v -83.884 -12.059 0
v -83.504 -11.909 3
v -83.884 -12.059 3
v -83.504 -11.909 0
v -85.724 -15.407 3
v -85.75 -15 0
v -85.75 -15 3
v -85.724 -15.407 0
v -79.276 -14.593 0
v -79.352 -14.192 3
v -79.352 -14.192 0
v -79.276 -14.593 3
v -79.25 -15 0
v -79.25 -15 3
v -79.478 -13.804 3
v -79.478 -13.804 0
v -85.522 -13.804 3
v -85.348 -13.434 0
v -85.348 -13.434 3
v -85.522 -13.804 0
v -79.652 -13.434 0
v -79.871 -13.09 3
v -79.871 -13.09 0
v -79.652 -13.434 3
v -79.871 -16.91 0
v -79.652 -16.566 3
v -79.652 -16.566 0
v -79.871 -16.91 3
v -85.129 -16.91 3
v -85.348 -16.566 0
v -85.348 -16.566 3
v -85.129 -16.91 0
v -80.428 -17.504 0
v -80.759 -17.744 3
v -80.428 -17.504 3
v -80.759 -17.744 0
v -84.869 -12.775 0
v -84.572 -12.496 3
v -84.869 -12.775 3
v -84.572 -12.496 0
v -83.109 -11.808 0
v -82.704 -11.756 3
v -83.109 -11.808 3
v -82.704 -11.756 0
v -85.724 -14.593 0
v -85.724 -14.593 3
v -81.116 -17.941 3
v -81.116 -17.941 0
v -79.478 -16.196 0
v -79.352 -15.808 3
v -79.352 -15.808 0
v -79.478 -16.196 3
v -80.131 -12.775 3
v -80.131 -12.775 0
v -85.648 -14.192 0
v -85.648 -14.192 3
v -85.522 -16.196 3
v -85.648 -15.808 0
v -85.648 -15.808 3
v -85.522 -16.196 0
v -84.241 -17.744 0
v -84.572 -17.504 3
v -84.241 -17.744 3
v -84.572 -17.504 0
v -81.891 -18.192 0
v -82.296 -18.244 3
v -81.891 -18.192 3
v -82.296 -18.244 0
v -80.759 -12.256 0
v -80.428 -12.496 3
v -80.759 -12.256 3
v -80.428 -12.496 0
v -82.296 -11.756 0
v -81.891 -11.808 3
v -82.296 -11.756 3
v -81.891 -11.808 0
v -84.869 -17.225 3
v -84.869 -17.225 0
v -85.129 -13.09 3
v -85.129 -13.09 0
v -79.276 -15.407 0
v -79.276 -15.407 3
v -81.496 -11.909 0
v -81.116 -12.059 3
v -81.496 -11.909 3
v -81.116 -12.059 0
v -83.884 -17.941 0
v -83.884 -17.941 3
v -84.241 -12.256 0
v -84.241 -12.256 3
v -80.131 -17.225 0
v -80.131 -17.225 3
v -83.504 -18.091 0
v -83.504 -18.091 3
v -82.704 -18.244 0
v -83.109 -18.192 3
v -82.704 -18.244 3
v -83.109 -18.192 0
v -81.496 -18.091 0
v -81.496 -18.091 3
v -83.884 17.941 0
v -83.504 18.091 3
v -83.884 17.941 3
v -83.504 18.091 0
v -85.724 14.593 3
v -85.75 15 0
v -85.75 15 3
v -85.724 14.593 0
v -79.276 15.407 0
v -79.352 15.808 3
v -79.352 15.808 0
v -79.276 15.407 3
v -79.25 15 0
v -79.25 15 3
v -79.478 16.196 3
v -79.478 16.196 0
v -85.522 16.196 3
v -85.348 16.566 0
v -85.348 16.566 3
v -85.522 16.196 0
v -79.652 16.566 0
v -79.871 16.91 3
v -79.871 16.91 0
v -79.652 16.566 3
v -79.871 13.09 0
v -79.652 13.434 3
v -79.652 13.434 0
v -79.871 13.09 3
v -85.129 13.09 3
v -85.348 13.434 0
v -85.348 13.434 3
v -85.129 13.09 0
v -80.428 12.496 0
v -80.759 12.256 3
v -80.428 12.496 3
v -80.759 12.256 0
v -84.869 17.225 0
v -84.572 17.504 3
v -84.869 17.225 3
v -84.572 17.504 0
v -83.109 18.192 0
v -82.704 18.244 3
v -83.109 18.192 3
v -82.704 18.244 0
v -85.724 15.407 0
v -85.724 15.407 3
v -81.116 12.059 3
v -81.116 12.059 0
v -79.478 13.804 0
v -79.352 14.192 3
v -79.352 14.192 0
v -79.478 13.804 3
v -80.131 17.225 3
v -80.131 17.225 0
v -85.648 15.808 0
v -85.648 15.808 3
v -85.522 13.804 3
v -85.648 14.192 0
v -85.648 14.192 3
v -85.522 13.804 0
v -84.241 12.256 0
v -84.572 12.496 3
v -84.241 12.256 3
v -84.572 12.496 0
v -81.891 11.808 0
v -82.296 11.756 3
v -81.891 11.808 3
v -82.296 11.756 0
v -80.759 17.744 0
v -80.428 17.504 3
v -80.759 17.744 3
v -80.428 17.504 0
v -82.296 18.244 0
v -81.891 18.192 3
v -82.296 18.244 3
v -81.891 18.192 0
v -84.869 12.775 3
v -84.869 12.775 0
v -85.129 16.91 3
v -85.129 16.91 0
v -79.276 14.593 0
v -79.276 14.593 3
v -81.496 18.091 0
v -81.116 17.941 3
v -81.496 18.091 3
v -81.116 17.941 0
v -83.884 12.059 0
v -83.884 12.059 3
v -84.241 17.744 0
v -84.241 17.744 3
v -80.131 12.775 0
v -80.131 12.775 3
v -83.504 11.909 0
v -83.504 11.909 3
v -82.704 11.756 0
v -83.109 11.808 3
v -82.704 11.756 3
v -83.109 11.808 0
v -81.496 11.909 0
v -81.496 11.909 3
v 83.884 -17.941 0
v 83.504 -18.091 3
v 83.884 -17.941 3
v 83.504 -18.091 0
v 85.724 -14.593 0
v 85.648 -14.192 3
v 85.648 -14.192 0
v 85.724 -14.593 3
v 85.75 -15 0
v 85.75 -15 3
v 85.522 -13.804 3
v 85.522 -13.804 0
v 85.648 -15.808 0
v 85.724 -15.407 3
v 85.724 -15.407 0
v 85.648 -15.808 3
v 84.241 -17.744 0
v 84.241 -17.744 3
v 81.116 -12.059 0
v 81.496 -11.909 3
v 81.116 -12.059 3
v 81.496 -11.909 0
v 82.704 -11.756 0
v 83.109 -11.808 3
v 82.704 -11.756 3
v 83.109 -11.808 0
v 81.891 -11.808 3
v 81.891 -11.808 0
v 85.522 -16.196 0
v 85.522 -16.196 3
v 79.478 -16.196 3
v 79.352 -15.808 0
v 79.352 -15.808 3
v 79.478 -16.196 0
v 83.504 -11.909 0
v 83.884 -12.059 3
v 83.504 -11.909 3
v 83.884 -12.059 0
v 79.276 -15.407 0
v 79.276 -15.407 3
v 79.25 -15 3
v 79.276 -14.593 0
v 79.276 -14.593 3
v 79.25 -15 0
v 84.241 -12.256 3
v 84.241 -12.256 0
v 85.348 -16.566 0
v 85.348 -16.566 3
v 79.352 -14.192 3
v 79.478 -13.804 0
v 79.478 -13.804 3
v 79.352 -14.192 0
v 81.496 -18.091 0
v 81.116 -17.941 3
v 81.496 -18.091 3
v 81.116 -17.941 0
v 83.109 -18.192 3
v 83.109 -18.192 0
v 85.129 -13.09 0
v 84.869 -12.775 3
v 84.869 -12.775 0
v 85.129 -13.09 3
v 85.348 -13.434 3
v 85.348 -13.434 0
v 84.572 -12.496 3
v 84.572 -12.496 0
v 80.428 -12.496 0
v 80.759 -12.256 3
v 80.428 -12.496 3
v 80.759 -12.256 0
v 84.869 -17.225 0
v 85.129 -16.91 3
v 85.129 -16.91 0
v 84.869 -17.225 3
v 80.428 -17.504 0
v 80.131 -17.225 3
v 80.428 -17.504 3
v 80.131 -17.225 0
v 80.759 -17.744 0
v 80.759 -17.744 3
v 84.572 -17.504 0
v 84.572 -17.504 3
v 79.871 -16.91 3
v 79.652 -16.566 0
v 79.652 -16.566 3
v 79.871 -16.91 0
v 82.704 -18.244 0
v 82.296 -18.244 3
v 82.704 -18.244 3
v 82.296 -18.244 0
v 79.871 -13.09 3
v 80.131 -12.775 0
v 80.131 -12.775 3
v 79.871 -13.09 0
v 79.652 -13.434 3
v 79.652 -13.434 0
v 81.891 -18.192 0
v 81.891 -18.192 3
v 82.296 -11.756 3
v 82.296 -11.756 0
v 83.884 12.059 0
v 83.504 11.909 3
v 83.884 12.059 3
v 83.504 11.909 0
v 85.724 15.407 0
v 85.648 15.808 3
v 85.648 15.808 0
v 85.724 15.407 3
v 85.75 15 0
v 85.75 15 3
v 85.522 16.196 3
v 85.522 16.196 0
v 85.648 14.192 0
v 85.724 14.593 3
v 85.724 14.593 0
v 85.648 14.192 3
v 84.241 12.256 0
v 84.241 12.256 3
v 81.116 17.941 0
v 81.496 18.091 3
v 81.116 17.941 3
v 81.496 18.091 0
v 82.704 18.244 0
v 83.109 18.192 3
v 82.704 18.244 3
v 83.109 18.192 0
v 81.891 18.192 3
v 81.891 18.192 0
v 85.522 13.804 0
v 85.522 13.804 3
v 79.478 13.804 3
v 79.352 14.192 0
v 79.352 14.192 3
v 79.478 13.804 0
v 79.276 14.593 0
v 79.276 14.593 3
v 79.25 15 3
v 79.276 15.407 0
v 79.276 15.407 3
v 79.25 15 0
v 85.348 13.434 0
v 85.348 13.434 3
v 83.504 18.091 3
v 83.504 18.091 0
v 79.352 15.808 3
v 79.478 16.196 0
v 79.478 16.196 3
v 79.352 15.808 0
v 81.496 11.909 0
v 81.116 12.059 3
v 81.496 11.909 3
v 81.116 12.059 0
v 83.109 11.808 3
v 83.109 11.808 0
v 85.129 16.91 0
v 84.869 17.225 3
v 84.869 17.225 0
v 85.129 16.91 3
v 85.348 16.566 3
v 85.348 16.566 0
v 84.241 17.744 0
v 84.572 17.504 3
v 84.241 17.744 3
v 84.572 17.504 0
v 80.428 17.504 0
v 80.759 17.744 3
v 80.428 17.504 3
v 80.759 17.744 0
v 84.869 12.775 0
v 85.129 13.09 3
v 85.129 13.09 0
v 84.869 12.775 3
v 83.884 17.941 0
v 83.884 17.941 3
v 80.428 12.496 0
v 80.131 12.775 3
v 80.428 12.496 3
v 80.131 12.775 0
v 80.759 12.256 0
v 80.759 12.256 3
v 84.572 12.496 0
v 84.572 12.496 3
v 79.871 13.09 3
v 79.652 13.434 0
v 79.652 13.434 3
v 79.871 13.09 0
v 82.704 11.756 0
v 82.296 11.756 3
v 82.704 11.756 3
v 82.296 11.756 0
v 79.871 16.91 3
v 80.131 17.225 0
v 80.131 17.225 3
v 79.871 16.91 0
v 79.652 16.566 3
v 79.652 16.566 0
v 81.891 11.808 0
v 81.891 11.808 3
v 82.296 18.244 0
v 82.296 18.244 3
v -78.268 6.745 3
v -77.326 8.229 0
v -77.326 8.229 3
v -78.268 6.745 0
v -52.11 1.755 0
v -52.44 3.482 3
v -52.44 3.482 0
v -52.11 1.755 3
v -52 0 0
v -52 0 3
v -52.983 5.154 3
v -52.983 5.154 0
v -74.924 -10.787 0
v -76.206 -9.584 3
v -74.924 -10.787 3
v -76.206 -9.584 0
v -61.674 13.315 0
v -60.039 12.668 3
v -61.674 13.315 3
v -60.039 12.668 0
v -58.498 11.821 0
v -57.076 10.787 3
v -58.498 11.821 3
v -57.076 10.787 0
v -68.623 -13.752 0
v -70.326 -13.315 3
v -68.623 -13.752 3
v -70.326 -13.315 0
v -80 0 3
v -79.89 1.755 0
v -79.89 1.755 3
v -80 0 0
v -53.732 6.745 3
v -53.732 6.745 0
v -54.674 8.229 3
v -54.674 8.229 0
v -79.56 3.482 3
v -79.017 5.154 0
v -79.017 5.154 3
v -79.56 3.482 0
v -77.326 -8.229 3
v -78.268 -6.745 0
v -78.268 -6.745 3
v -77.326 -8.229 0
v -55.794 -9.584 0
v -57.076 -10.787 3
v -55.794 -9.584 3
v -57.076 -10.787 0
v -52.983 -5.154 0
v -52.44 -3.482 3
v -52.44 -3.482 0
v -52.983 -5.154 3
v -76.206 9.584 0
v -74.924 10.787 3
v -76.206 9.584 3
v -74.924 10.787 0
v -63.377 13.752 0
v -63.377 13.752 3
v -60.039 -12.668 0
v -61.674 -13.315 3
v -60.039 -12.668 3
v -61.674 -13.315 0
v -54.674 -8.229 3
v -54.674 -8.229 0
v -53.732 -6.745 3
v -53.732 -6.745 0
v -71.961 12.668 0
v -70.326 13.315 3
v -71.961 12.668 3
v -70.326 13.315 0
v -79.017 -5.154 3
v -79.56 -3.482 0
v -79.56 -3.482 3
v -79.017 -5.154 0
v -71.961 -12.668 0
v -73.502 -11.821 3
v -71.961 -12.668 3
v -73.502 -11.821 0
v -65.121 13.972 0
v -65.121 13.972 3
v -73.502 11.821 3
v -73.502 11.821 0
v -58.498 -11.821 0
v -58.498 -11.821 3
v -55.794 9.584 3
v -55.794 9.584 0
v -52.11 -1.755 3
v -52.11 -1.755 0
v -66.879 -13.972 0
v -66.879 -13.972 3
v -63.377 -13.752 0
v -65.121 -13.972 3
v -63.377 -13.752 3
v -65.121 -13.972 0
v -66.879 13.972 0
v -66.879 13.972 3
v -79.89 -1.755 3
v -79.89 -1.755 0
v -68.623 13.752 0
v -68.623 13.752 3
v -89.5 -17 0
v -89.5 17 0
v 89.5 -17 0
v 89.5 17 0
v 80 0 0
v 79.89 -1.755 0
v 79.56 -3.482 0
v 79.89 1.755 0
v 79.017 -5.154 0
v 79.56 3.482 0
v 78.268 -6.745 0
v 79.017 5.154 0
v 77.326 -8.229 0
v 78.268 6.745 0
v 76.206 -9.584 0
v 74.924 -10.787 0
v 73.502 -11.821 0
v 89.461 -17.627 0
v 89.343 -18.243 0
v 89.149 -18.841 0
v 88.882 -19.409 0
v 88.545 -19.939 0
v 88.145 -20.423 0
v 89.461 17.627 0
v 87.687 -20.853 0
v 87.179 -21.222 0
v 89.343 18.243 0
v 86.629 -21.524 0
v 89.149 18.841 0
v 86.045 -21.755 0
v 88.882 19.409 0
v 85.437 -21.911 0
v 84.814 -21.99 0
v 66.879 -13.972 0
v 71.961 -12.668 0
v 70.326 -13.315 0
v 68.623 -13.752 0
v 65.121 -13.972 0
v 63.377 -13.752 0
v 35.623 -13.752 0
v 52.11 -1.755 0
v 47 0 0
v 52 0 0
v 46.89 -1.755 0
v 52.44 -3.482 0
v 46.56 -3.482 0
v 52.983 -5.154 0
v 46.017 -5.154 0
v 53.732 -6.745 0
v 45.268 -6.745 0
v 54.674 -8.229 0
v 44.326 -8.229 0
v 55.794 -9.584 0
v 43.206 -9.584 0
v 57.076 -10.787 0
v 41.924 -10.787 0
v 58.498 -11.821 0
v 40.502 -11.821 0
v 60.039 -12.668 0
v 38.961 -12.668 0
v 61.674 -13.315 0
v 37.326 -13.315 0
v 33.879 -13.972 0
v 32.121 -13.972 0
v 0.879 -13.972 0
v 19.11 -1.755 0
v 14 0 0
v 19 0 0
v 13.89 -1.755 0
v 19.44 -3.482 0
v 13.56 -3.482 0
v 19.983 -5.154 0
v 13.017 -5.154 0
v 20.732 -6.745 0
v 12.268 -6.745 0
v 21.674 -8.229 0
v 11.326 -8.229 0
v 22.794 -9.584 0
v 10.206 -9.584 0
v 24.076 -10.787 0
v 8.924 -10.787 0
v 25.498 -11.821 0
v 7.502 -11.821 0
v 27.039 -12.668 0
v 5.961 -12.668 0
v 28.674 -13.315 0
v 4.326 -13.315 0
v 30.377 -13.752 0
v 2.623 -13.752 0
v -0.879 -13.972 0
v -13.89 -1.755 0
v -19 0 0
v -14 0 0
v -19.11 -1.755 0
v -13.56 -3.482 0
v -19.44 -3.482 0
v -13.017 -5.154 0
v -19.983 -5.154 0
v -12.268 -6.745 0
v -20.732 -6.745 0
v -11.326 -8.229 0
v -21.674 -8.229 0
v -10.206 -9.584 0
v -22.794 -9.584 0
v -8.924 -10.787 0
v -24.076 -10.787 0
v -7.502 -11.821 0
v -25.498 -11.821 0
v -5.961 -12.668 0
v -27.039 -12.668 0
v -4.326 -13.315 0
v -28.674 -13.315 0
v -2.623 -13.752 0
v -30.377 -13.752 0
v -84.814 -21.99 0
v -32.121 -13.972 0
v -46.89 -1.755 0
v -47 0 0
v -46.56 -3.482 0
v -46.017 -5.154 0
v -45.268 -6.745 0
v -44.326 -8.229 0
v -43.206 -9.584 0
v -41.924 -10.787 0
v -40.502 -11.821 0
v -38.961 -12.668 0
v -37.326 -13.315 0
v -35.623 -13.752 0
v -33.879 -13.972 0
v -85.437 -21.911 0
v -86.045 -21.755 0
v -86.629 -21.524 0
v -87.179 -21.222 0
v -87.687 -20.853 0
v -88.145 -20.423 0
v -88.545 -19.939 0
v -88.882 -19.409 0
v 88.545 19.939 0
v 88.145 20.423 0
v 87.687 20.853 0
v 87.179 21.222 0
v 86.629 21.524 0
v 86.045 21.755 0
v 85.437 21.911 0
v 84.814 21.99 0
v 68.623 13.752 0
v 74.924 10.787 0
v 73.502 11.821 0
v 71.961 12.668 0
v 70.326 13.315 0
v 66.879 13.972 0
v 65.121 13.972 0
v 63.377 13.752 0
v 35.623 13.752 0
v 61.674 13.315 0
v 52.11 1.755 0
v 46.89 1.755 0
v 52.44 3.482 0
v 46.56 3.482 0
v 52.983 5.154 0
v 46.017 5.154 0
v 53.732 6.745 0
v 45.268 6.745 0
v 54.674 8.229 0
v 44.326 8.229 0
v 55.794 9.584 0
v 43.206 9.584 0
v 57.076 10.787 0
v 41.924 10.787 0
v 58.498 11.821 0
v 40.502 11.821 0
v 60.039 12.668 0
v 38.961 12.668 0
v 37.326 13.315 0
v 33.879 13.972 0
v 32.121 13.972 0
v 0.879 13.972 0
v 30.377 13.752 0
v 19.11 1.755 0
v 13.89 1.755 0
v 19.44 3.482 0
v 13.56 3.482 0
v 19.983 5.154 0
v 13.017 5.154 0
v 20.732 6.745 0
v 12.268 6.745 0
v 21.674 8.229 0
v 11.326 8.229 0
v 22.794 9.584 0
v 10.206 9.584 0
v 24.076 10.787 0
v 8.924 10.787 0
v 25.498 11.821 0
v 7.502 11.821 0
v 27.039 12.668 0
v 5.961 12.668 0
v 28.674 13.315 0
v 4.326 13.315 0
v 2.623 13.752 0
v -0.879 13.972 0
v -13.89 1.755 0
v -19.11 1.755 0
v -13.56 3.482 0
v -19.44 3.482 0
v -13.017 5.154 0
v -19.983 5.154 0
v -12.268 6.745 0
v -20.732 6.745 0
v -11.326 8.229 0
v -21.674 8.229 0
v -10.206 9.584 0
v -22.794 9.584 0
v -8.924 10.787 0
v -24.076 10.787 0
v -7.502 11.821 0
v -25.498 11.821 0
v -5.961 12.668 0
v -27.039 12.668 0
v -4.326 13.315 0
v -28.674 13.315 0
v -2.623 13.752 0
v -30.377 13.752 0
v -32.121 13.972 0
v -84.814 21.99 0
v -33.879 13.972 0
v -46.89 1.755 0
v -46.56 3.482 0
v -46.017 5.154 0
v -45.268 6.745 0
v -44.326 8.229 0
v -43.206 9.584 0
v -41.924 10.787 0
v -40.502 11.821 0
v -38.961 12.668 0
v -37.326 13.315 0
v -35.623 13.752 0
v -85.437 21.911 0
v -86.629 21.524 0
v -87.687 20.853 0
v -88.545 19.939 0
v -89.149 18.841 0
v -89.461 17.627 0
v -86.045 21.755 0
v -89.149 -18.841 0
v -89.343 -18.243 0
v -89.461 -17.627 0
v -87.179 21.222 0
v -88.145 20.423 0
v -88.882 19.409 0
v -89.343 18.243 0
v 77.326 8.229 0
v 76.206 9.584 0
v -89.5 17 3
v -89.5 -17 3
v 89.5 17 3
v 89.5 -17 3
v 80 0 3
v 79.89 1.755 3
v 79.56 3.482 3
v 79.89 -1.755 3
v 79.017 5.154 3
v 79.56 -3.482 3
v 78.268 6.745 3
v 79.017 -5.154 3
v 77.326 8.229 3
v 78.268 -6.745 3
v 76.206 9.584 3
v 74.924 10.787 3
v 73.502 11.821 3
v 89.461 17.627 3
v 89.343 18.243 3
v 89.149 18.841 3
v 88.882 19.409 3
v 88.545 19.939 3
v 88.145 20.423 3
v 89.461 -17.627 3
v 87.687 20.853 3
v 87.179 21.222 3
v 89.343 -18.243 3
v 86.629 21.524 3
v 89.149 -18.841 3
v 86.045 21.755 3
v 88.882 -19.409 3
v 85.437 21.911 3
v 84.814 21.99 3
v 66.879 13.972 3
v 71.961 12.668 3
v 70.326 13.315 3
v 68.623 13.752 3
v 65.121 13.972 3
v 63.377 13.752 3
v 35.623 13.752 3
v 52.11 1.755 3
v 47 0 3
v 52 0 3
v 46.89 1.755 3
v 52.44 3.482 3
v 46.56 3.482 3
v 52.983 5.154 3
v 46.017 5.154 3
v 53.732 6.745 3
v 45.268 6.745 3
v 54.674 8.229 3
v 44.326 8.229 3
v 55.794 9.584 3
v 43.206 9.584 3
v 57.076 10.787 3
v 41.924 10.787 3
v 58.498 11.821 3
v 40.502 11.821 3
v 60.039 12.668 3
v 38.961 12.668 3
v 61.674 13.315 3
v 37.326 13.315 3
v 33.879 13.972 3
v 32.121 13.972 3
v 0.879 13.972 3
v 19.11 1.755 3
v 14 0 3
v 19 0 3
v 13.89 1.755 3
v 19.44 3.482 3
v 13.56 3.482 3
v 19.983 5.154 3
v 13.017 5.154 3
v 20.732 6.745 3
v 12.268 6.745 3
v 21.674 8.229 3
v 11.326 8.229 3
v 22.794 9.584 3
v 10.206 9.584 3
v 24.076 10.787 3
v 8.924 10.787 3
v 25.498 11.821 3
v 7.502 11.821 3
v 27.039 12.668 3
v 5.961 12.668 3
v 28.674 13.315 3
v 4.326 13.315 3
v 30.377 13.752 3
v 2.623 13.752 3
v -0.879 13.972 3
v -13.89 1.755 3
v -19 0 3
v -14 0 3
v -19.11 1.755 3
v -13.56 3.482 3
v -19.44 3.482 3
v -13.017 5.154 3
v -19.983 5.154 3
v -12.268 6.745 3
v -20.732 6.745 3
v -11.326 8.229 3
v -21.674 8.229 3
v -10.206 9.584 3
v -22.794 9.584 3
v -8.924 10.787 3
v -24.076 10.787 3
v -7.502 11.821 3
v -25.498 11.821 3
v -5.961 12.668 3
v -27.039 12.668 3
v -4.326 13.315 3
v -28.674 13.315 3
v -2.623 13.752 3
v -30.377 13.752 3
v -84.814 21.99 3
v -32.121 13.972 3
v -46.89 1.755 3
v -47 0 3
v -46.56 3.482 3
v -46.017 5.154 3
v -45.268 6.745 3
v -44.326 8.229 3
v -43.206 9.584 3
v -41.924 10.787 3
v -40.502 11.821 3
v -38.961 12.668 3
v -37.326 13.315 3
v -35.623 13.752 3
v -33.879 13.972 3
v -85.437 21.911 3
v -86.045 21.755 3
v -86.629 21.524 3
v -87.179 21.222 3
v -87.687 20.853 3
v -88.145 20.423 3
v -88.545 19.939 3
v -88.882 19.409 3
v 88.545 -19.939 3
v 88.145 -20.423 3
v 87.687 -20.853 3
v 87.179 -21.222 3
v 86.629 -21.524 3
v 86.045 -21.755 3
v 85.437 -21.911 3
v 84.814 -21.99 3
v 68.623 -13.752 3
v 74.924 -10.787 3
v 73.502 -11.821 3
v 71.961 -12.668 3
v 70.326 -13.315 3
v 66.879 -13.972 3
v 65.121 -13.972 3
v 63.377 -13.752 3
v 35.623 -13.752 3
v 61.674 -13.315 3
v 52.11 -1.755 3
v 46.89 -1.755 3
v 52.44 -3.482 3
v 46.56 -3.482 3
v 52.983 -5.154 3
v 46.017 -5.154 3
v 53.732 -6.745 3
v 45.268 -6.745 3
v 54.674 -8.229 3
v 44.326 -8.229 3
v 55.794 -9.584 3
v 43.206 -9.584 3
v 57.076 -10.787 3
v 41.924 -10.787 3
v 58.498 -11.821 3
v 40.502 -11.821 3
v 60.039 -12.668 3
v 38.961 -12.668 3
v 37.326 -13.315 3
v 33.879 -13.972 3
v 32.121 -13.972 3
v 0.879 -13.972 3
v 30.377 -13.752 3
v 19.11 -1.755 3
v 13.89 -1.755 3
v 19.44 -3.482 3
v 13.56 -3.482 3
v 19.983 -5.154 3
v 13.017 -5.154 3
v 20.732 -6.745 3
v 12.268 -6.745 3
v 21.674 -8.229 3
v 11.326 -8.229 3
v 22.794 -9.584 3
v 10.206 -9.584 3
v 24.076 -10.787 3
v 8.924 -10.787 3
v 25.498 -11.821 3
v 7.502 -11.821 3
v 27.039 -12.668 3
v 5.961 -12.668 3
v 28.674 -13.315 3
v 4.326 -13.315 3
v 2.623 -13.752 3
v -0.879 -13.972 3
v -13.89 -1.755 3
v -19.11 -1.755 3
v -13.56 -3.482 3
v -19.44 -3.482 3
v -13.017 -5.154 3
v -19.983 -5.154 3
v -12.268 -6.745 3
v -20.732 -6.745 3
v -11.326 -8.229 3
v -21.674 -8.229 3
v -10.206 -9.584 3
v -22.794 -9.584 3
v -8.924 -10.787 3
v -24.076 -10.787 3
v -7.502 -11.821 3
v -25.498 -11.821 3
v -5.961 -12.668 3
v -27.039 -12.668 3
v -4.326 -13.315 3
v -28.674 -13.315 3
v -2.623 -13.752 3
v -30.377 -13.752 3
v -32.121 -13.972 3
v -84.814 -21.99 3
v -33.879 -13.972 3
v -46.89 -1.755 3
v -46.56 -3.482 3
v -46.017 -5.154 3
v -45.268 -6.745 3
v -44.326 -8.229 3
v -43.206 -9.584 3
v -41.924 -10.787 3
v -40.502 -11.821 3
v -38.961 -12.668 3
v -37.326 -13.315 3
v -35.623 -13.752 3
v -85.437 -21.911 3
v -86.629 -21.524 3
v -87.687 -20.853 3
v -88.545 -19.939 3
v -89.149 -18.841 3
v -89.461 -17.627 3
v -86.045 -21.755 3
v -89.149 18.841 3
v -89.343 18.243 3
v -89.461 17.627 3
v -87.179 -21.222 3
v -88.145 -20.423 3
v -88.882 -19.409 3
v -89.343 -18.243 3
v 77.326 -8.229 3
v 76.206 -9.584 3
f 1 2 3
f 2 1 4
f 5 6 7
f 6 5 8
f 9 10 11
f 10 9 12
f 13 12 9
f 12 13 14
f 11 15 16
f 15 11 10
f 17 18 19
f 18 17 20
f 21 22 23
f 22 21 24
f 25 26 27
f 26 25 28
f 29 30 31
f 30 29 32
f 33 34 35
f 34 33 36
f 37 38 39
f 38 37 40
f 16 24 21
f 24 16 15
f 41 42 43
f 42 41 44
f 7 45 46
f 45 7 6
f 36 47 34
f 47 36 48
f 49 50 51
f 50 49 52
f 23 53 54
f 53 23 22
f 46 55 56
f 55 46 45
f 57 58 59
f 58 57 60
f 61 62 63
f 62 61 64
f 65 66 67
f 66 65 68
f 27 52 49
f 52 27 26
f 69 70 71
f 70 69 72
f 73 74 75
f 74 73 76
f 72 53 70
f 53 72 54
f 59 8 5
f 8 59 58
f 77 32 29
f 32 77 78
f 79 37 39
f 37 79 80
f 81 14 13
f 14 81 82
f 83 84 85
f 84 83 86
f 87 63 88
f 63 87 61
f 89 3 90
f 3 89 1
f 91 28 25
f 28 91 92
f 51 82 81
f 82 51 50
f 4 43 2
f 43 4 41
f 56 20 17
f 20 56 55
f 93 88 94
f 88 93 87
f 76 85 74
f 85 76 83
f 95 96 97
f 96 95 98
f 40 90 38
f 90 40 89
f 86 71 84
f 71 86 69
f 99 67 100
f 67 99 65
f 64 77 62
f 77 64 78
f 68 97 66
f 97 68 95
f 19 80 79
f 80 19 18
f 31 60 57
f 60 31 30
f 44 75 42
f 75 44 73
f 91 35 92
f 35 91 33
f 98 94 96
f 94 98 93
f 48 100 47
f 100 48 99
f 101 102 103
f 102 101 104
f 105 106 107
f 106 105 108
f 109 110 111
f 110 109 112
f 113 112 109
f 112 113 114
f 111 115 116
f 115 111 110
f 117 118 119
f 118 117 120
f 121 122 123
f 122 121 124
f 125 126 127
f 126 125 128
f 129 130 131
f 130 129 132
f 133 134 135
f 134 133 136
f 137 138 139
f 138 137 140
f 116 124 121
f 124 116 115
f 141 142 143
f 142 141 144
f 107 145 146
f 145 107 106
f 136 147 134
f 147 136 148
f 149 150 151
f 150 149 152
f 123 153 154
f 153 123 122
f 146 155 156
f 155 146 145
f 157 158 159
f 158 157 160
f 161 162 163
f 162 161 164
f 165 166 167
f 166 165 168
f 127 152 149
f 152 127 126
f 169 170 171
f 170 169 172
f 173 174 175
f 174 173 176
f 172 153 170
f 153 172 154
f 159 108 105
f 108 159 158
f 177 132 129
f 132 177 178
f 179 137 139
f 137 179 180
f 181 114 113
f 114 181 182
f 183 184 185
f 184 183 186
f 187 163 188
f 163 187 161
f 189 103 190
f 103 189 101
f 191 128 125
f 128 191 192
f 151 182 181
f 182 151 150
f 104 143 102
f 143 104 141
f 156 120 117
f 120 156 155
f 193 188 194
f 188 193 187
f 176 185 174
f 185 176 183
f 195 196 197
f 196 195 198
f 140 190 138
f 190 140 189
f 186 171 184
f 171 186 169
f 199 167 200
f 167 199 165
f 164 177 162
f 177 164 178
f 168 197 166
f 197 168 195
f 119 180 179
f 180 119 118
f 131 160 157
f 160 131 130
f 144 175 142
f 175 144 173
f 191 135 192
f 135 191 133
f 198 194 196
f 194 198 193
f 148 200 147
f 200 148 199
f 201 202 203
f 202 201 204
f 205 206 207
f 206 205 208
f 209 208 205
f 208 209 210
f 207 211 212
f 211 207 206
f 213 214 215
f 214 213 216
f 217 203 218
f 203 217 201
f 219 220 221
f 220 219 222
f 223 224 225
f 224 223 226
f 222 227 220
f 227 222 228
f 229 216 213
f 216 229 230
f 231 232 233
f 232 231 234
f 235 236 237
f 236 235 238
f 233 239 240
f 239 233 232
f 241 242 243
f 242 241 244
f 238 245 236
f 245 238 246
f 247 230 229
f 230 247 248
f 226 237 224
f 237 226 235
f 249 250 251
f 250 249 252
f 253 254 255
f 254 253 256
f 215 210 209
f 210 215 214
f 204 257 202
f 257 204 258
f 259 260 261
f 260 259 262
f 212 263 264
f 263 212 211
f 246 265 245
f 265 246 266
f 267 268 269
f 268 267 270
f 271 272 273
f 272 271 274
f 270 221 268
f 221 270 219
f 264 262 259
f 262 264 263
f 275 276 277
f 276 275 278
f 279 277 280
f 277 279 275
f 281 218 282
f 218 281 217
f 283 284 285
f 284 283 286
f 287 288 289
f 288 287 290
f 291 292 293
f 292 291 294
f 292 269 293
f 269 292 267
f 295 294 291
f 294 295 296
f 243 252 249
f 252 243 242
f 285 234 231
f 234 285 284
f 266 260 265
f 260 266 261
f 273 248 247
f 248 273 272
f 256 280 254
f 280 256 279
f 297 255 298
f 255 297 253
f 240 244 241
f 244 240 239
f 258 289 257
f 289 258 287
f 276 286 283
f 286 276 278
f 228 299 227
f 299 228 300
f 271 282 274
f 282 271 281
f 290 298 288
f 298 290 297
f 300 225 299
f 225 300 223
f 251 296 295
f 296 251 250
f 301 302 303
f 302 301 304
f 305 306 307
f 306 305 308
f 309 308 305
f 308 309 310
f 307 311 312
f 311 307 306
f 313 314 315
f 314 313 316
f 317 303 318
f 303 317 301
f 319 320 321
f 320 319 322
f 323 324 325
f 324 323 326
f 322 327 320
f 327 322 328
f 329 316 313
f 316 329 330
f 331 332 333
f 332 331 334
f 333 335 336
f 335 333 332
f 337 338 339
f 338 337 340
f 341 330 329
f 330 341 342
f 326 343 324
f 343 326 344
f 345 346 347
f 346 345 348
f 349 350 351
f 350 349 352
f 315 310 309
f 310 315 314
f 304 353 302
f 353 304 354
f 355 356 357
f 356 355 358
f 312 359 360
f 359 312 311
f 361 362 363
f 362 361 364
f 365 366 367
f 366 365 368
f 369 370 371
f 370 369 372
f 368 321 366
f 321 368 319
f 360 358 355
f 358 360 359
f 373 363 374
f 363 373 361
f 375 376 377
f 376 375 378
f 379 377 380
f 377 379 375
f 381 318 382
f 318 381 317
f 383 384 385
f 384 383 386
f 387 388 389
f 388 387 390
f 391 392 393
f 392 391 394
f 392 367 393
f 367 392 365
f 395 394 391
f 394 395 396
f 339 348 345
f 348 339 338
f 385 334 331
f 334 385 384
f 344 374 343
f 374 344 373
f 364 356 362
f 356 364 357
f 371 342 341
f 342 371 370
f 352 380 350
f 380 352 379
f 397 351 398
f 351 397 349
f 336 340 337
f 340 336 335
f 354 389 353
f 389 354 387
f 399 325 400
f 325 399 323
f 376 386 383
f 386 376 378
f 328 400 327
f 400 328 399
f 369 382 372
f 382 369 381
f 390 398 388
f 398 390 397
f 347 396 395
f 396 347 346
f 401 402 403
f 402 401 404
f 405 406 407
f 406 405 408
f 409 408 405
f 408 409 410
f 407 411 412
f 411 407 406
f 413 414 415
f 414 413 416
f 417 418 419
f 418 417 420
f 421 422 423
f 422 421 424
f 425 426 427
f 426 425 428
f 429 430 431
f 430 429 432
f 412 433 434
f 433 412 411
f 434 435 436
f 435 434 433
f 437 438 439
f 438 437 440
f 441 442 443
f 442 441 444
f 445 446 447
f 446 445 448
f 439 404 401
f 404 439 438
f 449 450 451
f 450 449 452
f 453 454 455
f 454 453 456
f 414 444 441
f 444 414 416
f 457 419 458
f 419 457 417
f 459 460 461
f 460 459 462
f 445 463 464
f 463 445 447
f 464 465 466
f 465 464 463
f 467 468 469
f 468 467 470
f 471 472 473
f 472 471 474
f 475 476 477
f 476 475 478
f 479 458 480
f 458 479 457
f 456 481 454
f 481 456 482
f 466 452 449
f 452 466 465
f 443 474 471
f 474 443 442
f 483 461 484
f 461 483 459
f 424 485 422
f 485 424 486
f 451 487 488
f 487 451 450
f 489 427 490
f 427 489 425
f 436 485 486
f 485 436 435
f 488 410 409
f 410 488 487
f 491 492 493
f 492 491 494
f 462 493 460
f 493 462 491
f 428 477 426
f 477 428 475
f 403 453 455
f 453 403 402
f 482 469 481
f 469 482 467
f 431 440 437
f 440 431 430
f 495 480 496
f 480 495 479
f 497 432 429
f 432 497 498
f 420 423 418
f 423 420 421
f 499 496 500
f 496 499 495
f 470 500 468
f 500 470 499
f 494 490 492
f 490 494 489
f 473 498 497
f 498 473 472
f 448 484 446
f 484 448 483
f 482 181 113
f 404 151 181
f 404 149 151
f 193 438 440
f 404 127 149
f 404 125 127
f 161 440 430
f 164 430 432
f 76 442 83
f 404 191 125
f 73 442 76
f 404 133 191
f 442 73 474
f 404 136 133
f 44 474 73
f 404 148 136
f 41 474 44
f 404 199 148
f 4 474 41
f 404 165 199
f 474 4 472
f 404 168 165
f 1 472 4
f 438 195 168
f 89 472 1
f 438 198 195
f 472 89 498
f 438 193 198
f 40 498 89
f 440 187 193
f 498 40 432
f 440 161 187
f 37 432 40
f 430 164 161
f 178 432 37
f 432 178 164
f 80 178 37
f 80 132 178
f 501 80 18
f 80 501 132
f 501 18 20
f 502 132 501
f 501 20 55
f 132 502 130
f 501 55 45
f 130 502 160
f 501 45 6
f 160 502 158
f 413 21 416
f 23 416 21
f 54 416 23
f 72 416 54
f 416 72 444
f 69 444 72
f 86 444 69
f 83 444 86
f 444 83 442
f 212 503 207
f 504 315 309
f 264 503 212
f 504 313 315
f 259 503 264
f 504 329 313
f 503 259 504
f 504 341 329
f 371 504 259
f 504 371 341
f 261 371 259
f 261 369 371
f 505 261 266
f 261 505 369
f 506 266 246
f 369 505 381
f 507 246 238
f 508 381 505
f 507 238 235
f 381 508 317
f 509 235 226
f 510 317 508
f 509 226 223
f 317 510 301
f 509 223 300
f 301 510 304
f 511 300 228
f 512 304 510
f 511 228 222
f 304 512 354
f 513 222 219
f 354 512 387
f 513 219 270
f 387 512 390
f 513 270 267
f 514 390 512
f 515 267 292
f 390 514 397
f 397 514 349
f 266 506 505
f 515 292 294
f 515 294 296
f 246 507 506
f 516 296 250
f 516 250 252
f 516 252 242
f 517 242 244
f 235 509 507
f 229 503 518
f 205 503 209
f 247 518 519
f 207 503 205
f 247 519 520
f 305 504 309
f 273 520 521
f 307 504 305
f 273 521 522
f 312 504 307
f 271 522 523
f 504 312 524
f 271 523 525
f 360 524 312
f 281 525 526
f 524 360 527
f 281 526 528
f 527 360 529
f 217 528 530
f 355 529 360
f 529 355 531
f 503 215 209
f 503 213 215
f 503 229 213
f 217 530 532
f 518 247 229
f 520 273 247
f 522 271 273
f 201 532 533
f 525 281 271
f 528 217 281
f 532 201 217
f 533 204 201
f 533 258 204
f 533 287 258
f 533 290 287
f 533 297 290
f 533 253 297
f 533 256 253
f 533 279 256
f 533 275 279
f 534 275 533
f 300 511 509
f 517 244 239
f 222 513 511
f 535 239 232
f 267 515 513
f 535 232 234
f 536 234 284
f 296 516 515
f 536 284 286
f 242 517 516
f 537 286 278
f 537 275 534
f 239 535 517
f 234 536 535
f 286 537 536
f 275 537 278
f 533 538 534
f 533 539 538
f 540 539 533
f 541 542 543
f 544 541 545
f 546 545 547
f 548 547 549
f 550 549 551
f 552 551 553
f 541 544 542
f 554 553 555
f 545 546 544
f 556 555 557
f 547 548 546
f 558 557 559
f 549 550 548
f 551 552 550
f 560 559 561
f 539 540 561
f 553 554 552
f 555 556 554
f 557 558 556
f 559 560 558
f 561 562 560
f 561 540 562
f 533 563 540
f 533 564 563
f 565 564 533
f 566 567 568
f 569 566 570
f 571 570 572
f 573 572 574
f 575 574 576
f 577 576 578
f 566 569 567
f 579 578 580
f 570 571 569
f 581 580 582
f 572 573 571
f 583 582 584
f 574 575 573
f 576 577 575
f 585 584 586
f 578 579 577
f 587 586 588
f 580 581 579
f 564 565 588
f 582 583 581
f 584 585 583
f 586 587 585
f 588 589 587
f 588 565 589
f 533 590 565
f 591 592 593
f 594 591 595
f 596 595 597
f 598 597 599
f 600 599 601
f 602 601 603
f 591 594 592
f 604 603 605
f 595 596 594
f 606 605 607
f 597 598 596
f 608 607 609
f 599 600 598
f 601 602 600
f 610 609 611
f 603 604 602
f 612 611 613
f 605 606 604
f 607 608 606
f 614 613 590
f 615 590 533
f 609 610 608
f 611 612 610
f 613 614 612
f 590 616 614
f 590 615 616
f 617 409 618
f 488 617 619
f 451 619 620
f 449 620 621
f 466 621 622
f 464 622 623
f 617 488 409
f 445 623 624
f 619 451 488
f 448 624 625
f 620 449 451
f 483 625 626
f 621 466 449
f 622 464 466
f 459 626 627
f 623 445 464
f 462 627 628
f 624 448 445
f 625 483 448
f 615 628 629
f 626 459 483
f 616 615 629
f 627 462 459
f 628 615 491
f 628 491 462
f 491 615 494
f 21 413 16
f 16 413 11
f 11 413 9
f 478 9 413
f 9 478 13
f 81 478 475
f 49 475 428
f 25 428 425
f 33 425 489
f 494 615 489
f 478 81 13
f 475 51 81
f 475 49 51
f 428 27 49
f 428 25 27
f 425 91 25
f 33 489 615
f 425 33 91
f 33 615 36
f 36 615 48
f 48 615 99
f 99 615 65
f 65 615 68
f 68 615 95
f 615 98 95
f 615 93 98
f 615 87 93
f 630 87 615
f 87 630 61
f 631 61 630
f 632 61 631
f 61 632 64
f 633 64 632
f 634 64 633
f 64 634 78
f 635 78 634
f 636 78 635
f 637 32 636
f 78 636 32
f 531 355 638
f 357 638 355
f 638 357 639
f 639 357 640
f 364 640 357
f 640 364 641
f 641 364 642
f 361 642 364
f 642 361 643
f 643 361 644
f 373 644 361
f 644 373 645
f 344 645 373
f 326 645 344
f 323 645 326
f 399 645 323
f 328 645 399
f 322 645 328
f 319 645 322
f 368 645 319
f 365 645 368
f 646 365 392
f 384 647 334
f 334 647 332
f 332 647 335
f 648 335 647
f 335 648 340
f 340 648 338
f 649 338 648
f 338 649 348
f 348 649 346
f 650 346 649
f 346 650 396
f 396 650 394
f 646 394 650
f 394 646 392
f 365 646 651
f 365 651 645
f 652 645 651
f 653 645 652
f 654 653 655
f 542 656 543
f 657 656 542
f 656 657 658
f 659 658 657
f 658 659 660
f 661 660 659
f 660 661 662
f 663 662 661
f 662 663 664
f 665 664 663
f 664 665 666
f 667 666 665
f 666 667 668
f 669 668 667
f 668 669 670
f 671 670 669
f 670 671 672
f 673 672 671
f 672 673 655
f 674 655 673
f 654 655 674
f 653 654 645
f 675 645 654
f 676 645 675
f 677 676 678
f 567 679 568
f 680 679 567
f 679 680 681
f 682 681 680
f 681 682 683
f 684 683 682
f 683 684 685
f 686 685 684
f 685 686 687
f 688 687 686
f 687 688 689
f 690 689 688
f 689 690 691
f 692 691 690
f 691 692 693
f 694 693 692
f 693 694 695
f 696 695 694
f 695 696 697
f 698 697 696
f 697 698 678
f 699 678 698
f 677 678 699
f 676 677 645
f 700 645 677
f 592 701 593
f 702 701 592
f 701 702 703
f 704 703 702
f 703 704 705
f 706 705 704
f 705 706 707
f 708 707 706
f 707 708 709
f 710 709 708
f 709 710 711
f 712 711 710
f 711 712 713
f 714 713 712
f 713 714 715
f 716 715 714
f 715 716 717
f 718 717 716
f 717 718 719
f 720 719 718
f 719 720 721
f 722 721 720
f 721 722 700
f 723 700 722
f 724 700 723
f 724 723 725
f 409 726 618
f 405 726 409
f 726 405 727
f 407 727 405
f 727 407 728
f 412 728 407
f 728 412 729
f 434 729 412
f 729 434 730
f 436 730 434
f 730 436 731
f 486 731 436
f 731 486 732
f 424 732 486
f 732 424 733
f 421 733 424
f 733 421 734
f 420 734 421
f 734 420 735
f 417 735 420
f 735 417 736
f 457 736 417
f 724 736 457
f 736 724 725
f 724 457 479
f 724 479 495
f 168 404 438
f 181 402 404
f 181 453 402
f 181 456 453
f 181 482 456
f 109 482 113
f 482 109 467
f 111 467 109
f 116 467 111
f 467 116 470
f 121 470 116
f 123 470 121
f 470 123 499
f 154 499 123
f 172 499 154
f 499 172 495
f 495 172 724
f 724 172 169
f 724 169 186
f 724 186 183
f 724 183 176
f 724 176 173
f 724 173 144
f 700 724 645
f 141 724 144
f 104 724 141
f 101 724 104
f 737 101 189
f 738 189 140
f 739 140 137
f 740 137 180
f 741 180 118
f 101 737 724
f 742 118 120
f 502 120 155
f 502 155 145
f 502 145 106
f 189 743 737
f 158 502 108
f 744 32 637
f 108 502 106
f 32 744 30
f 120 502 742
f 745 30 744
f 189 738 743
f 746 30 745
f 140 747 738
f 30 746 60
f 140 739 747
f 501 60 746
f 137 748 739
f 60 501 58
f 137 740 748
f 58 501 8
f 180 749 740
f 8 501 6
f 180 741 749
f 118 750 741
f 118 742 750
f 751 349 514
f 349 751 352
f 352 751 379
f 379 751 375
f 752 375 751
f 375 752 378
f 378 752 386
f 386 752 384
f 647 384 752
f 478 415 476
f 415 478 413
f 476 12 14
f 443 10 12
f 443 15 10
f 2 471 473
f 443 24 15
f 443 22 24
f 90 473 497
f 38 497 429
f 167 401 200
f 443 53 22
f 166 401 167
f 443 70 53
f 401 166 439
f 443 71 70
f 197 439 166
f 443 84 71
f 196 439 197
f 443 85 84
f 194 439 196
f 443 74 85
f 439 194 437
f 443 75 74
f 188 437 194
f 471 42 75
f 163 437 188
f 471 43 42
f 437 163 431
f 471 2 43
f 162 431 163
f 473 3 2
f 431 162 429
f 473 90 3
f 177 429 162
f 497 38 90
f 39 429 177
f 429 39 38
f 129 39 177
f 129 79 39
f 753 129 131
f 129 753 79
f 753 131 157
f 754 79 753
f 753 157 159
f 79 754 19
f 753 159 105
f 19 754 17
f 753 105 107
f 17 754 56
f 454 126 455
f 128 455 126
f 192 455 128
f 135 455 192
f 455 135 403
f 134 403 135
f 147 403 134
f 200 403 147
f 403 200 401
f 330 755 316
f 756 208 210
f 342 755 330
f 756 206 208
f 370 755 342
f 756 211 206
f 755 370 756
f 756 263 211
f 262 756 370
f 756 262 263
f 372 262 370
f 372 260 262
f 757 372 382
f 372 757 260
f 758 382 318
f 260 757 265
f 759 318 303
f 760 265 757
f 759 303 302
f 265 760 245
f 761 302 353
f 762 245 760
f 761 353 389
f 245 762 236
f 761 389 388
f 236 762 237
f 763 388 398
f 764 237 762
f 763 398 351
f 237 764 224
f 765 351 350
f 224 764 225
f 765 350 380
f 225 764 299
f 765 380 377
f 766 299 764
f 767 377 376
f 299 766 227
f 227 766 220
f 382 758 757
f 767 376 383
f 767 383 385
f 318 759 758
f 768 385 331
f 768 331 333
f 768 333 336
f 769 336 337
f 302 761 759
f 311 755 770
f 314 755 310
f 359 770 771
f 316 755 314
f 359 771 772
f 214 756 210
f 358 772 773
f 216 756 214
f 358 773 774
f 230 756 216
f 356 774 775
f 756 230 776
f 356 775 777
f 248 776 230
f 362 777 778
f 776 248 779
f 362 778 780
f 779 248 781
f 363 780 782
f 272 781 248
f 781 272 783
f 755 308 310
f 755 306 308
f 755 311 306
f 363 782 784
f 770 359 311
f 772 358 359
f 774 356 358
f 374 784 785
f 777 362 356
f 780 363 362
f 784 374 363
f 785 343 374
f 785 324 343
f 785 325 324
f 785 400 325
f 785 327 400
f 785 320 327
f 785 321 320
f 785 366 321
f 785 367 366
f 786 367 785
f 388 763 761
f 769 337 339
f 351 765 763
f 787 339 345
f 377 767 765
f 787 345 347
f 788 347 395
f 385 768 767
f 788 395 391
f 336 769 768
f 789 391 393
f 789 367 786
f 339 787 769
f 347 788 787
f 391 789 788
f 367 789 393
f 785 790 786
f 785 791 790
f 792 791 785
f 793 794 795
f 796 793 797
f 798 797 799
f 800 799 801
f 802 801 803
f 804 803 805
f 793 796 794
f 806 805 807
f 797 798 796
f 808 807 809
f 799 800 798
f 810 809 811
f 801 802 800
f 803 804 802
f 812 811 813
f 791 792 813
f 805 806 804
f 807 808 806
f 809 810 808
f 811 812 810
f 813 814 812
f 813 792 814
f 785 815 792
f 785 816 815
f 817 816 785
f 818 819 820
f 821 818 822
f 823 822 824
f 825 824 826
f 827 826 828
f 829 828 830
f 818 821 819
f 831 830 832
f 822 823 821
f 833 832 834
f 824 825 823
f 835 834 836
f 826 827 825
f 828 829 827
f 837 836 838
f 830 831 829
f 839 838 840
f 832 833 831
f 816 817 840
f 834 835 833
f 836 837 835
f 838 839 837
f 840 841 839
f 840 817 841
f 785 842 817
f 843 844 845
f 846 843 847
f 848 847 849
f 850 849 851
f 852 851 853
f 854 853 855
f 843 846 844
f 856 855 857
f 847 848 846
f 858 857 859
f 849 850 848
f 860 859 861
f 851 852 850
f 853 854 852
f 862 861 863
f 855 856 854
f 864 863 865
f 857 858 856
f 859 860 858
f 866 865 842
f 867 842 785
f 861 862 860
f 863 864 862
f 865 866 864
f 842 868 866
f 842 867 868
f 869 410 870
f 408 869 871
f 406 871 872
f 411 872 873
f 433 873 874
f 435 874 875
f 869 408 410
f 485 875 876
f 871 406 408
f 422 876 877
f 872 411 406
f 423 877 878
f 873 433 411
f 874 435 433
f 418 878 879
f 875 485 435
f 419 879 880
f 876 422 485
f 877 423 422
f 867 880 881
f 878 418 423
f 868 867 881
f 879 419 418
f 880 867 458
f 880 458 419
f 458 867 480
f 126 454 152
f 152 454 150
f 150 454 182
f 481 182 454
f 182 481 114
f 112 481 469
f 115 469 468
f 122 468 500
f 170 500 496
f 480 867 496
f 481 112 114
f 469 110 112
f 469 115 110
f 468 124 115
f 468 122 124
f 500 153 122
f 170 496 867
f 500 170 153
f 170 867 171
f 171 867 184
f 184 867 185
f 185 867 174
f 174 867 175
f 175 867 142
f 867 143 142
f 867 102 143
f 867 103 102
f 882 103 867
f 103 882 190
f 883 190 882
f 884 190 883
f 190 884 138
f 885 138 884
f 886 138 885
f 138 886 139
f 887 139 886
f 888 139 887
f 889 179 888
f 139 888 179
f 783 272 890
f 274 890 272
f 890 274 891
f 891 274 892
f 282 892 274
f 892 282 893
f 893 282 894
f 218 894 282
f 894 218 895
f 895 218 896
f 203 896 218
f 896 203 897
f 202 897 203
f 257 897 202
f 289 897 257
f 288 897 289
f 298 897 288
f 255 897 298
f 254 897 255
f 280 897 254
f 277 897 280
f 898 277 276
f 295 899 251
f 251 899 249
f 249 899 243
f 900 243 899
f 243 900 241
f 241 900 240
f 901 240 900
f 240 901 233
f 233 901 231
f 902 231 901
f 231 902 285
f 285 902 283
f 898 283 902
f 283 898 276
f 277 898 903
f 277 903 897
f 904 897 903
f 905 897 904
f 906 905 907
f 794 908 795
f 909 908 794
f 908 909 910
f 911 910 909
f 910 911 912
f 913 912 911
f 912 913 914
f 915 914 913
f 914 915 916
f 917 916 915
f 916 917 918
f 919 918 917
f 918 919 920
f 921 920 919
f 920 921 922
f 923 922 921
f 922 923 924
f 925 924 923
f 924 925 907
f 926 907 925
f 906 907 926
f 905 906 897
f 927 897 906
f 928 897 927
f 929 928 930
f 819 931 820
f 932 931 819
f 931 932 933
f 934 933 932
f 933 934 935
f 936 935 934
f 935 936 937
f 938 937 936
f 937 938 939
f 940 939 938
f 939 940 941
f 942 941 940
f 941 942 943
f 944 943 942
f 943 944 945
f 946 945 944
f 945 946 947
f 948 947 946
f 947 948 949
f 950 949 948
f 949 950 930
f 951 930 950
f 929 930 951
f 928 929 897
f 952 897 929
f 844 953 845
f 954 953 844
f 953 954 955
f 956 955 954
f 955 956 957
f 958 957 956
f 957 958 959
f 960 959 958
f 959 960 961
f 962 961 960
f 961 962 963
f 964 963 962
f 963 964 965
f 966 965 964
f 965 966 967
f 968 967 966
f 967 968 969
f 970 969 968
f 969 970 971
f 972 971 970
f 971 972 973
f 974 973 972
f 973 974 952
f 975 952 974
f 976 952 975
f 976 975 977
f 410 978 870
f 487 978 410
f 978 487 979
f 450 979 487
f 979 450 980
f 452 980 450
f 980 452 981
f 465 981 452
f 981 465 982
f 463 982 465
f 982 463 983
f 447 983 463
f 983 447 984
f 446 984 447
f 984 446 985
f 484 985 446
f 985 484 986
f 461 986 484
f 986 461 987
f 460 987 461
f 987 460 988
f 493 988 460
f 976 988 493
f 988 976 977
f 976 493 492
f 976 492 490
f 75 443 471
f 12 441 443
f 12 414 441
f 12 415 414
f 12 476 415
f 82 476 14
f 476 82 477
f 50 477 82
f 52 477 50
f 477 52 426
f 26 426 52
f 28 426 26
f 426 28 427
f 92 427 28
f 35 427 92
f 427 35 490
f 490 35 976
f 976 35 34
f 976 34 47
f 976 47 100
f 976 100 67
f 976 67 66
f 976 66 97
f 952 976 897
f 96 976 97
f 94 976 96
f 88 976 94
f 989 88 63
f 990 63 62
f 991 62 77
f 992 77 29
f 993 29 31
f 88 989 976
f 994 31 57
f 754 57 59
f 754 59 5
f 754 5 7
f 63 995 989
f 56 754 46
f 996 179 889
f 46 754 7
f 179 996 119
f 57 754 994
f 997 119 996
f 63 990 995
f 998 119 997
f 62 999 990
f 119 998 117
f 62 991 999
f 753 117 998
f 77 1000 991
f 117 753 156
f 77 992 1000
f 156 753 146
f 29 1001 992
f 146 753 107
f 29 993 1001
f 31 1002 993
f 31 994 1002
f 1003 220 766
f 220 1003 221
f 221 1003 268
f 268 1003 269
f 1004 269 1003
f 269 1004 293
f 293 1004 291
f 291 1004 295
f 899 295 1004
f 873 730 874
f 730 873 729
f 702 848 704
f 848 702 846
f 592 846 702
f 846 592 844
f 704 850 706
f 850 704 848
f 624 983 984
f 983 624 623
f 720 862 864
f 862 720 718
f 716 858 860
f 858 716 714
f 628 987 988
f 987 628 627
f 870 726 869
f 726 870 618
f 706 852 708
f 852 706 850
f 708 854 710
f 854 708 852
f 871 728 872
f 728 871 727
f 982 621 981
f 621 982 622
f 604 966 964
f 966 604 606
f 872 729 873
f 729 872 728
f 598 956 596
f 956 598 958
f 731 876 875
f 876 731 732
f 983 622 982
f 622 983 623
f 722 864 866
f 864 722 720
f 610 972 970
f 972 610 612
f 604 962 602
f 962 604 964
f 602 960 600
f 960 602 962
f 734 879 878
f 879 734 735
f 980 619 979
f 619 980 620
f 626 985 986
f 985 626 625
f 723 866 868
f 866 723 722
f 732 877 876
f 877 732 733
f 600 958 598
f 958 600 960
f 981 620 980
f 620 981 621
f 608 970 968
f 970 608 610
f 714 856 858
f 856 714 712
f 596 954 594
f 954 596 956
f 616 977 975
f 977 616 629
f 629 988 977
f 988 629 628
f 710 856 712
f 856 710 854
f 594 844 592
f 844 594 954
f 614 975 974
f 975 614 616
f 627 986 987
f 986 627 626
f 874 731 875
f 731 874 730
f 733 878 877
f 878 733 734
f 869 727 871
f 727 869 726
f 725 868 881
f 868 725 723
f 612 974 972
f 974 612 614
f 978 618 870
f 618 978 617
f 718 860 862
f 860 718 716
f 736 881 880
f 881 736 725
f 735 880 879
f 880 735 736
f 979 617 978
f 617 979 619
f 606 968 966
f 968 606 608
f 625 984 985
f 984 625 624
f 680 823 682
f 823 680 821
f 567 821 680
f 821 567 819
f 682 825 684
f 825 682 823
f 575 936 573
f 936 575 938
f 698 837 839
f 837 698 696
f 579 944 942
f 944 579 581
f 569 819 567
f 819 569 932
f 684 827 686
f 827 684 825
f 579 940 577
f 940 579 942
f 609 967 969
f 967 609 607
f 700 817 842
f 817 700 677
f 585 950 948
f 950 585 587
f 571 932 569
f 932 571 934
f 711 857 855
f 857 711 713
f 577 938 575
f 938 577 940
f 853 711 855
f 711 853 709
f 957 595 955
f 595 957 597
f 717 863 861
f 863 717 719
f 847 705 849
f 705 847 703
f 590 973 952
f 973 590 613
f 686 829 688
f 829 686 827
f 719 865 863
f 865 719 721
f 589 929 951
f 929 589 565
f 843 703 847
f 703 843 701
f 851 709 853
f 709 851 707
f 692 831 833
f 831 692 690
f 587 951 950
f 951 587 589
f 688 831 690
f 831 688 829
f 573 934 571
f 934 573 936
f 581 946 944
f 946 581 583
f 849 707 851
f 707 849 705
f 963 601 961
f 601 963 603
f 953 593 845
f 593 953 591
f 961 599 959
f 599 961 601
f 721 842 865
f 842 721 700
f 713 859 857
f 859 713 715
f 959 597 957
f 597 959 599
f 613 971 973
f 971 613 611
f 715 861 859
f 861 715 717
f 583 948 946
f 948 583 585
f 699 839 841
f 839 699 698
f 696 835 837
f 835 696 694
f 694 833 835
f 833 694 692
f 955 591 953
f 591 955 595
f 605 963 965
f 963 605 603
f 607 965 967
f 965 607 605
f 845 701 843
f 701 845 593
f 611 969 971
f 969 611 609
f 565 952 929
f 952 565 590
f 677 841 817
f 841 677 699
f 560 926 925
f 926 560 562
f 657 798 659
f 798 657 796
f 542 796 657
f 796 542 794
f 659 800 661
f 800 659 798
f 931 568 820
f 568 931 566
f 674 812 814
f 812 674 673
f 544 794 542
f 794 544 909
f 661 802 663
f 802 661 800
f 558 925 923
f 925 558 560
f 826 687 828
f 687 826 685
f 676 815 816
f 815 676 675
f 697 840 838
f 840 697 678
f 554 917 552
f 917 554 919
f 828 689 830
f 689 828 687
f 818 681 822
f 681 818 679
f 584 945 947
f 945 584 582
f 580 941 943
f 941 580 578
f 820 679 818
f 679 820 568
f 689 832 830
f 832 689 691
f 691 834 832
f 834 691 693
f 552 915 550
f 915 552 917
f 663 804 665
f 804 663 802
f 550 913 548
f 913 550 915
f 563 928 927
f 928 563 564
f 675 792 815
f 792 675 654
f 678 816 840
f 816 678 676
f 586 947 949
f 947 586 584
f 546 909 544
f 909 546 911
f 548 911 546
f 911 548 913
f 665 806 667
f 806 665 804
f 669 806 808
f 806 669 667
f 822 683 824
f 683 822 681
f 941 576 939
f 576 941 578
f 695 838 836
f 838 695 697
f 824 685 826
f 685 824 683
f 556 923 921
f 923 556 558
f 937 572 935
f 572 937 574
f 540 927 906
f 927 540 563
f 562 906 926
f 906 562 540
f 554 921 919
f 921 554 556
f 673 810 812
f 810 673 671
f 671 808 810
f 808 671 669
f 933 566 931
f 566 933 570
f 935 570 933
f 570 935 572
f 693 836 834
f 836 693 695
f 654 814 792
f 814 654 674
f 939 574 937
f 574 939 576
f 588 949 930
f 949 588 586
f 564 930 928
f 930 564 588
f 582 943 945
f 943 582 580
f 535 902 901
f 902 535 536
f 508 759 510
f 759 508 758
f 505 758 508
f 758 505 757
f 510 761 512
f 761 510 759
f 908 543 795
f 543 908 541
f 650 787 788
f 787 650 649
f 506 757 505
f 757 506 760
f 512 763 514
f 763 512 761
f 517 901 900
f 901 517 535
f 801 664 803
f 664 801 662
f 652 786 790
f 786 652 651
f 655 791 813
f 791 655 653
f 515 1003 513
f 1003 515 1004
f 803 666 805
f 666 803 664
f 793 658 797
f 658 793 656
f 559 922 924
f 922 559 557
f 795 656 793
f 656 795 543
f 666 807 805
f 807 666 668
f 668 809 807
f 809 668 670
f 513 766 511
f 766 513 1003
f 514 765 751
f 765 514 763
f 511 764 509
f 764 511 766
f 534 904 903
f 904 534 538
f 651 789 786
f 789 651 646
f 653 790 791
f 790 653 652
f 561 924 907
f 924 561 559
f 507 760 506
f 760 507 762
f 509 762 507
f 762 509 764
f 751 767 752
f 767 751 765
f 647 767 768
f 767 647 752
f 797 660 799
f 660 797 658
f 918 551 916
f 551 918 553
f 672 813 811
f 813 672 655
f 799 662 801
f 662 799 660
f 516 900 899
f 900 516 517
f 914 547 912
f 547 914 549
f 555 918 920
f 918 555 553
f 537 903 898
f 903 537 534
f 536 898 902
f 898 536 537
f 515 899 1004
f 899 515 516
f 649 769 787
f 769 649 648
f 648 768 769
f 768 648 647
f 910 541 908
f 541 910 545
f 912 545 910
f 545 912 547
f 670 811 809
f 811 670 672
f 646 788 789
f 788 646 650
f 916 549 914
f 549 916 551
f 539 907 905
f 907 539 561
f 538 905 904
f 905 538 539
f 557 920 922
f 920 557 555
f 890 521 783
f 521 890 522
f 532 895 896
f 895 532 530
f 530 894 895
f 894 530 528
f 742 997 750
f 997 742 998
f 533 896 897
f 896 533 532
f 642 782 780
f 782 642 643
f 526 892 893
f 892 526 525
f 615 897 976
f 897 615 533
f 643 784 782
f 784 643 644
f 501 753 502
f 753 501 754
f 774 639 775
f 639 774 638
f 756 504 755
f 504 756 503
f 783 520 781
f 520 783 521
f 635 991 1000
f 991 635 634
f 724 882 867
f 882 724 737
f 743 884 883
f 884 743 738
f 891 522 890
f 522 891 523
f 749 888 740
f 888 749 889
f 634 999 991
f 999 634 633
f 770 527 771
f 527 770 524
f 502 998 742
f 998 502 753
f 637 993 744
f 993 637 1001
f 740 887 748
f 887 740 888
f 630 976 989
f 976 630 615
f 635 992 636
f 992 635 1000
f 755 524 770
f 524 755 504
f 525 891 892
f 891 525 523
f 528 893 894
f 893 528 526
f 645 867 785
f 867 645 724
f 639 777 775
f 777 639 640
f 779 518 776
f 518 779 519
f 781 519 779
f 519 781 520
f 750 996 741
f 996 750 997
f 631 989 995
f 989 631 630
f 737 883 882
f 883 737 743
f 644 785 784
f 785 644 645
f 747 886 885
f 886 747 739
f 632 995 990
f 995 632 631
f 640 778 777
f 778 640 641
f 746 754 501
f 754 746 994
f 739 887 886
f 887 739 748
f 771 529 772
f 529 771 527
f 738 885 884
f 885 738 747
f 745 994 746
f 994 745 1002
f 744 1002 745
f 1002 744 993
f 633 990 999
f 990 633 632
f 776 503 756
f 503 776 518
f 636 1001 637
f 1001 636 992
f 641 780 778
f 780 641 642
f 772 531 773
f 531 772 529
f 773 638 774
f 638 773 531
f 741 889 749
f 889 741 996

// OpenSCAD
$fn = 50;

difference() {
	union() {
		hull() {
			translate(v = [-84.5, 17.0, 0]) {
				cylinder(h = 3, r = 5);
			}
			translate(v = [84.5, 17.0, 0]) {
				cylinder(h = 3, r = 5);
			}
			translate(v = [-84.5, -17.0, 0]) {
				cylinder(h = 3, r = 5);
			}
			translate(v = [84.5, -17.0, 0]) {
				cylinder(h = 3, r = 5);
			}
		}
	}
	union() {
		translate(v = [-82.5, -15.0, -100.0]) {
			cylinder(h = 200, r = 3.25);
		}
		translate(v = [-82.5, 15.0, -100.0]) {
			cylinder(h = 200, r = 3.25);
		}
		translate(v = [82.5, -15.0, -100.0]) {
			cylinder(h = 200, r = 3.25);
		}
		translate(v = [82.5, 15.0, -100.0]) {
			cylinder(h = 200, r = 3.25);
		}
		translate(v = [-82.5, -15.0, -100.0]) {
			cylinder(h = 200, r = 1.8);
		}
		translate(v = [-82.5, 15.0, -100.0]) {
			cylinder(h = 200, r = 1.8);
		}
		translate(v = [82.5, -15.0, -100.0]) {
			cylinder(h = 200, r = 1.8);
		}
		translate(v = [82.5, 15.0, -100.0]) {
			cylinder(h = 200, r = 1.8);
		}
		translate(v = [-66.0, 0, 0.0]) {
			cylinder(h = 3, r = 14.0);
		}
		translate(v = [-33.0, 0, 0.0]) {
			cylinder(h = 3, r = 14.0);
		}
		cylinder(h = 3, r = 14.0);
		translate(v = [33.0, 0, 0.0]) {
			cylinder(h = 3, r = 14.0);
		}
		translate(v = [66.0, 0, 0.0]) {
			cylinder(h = 3, r = 14.0);
		}
	}
}
